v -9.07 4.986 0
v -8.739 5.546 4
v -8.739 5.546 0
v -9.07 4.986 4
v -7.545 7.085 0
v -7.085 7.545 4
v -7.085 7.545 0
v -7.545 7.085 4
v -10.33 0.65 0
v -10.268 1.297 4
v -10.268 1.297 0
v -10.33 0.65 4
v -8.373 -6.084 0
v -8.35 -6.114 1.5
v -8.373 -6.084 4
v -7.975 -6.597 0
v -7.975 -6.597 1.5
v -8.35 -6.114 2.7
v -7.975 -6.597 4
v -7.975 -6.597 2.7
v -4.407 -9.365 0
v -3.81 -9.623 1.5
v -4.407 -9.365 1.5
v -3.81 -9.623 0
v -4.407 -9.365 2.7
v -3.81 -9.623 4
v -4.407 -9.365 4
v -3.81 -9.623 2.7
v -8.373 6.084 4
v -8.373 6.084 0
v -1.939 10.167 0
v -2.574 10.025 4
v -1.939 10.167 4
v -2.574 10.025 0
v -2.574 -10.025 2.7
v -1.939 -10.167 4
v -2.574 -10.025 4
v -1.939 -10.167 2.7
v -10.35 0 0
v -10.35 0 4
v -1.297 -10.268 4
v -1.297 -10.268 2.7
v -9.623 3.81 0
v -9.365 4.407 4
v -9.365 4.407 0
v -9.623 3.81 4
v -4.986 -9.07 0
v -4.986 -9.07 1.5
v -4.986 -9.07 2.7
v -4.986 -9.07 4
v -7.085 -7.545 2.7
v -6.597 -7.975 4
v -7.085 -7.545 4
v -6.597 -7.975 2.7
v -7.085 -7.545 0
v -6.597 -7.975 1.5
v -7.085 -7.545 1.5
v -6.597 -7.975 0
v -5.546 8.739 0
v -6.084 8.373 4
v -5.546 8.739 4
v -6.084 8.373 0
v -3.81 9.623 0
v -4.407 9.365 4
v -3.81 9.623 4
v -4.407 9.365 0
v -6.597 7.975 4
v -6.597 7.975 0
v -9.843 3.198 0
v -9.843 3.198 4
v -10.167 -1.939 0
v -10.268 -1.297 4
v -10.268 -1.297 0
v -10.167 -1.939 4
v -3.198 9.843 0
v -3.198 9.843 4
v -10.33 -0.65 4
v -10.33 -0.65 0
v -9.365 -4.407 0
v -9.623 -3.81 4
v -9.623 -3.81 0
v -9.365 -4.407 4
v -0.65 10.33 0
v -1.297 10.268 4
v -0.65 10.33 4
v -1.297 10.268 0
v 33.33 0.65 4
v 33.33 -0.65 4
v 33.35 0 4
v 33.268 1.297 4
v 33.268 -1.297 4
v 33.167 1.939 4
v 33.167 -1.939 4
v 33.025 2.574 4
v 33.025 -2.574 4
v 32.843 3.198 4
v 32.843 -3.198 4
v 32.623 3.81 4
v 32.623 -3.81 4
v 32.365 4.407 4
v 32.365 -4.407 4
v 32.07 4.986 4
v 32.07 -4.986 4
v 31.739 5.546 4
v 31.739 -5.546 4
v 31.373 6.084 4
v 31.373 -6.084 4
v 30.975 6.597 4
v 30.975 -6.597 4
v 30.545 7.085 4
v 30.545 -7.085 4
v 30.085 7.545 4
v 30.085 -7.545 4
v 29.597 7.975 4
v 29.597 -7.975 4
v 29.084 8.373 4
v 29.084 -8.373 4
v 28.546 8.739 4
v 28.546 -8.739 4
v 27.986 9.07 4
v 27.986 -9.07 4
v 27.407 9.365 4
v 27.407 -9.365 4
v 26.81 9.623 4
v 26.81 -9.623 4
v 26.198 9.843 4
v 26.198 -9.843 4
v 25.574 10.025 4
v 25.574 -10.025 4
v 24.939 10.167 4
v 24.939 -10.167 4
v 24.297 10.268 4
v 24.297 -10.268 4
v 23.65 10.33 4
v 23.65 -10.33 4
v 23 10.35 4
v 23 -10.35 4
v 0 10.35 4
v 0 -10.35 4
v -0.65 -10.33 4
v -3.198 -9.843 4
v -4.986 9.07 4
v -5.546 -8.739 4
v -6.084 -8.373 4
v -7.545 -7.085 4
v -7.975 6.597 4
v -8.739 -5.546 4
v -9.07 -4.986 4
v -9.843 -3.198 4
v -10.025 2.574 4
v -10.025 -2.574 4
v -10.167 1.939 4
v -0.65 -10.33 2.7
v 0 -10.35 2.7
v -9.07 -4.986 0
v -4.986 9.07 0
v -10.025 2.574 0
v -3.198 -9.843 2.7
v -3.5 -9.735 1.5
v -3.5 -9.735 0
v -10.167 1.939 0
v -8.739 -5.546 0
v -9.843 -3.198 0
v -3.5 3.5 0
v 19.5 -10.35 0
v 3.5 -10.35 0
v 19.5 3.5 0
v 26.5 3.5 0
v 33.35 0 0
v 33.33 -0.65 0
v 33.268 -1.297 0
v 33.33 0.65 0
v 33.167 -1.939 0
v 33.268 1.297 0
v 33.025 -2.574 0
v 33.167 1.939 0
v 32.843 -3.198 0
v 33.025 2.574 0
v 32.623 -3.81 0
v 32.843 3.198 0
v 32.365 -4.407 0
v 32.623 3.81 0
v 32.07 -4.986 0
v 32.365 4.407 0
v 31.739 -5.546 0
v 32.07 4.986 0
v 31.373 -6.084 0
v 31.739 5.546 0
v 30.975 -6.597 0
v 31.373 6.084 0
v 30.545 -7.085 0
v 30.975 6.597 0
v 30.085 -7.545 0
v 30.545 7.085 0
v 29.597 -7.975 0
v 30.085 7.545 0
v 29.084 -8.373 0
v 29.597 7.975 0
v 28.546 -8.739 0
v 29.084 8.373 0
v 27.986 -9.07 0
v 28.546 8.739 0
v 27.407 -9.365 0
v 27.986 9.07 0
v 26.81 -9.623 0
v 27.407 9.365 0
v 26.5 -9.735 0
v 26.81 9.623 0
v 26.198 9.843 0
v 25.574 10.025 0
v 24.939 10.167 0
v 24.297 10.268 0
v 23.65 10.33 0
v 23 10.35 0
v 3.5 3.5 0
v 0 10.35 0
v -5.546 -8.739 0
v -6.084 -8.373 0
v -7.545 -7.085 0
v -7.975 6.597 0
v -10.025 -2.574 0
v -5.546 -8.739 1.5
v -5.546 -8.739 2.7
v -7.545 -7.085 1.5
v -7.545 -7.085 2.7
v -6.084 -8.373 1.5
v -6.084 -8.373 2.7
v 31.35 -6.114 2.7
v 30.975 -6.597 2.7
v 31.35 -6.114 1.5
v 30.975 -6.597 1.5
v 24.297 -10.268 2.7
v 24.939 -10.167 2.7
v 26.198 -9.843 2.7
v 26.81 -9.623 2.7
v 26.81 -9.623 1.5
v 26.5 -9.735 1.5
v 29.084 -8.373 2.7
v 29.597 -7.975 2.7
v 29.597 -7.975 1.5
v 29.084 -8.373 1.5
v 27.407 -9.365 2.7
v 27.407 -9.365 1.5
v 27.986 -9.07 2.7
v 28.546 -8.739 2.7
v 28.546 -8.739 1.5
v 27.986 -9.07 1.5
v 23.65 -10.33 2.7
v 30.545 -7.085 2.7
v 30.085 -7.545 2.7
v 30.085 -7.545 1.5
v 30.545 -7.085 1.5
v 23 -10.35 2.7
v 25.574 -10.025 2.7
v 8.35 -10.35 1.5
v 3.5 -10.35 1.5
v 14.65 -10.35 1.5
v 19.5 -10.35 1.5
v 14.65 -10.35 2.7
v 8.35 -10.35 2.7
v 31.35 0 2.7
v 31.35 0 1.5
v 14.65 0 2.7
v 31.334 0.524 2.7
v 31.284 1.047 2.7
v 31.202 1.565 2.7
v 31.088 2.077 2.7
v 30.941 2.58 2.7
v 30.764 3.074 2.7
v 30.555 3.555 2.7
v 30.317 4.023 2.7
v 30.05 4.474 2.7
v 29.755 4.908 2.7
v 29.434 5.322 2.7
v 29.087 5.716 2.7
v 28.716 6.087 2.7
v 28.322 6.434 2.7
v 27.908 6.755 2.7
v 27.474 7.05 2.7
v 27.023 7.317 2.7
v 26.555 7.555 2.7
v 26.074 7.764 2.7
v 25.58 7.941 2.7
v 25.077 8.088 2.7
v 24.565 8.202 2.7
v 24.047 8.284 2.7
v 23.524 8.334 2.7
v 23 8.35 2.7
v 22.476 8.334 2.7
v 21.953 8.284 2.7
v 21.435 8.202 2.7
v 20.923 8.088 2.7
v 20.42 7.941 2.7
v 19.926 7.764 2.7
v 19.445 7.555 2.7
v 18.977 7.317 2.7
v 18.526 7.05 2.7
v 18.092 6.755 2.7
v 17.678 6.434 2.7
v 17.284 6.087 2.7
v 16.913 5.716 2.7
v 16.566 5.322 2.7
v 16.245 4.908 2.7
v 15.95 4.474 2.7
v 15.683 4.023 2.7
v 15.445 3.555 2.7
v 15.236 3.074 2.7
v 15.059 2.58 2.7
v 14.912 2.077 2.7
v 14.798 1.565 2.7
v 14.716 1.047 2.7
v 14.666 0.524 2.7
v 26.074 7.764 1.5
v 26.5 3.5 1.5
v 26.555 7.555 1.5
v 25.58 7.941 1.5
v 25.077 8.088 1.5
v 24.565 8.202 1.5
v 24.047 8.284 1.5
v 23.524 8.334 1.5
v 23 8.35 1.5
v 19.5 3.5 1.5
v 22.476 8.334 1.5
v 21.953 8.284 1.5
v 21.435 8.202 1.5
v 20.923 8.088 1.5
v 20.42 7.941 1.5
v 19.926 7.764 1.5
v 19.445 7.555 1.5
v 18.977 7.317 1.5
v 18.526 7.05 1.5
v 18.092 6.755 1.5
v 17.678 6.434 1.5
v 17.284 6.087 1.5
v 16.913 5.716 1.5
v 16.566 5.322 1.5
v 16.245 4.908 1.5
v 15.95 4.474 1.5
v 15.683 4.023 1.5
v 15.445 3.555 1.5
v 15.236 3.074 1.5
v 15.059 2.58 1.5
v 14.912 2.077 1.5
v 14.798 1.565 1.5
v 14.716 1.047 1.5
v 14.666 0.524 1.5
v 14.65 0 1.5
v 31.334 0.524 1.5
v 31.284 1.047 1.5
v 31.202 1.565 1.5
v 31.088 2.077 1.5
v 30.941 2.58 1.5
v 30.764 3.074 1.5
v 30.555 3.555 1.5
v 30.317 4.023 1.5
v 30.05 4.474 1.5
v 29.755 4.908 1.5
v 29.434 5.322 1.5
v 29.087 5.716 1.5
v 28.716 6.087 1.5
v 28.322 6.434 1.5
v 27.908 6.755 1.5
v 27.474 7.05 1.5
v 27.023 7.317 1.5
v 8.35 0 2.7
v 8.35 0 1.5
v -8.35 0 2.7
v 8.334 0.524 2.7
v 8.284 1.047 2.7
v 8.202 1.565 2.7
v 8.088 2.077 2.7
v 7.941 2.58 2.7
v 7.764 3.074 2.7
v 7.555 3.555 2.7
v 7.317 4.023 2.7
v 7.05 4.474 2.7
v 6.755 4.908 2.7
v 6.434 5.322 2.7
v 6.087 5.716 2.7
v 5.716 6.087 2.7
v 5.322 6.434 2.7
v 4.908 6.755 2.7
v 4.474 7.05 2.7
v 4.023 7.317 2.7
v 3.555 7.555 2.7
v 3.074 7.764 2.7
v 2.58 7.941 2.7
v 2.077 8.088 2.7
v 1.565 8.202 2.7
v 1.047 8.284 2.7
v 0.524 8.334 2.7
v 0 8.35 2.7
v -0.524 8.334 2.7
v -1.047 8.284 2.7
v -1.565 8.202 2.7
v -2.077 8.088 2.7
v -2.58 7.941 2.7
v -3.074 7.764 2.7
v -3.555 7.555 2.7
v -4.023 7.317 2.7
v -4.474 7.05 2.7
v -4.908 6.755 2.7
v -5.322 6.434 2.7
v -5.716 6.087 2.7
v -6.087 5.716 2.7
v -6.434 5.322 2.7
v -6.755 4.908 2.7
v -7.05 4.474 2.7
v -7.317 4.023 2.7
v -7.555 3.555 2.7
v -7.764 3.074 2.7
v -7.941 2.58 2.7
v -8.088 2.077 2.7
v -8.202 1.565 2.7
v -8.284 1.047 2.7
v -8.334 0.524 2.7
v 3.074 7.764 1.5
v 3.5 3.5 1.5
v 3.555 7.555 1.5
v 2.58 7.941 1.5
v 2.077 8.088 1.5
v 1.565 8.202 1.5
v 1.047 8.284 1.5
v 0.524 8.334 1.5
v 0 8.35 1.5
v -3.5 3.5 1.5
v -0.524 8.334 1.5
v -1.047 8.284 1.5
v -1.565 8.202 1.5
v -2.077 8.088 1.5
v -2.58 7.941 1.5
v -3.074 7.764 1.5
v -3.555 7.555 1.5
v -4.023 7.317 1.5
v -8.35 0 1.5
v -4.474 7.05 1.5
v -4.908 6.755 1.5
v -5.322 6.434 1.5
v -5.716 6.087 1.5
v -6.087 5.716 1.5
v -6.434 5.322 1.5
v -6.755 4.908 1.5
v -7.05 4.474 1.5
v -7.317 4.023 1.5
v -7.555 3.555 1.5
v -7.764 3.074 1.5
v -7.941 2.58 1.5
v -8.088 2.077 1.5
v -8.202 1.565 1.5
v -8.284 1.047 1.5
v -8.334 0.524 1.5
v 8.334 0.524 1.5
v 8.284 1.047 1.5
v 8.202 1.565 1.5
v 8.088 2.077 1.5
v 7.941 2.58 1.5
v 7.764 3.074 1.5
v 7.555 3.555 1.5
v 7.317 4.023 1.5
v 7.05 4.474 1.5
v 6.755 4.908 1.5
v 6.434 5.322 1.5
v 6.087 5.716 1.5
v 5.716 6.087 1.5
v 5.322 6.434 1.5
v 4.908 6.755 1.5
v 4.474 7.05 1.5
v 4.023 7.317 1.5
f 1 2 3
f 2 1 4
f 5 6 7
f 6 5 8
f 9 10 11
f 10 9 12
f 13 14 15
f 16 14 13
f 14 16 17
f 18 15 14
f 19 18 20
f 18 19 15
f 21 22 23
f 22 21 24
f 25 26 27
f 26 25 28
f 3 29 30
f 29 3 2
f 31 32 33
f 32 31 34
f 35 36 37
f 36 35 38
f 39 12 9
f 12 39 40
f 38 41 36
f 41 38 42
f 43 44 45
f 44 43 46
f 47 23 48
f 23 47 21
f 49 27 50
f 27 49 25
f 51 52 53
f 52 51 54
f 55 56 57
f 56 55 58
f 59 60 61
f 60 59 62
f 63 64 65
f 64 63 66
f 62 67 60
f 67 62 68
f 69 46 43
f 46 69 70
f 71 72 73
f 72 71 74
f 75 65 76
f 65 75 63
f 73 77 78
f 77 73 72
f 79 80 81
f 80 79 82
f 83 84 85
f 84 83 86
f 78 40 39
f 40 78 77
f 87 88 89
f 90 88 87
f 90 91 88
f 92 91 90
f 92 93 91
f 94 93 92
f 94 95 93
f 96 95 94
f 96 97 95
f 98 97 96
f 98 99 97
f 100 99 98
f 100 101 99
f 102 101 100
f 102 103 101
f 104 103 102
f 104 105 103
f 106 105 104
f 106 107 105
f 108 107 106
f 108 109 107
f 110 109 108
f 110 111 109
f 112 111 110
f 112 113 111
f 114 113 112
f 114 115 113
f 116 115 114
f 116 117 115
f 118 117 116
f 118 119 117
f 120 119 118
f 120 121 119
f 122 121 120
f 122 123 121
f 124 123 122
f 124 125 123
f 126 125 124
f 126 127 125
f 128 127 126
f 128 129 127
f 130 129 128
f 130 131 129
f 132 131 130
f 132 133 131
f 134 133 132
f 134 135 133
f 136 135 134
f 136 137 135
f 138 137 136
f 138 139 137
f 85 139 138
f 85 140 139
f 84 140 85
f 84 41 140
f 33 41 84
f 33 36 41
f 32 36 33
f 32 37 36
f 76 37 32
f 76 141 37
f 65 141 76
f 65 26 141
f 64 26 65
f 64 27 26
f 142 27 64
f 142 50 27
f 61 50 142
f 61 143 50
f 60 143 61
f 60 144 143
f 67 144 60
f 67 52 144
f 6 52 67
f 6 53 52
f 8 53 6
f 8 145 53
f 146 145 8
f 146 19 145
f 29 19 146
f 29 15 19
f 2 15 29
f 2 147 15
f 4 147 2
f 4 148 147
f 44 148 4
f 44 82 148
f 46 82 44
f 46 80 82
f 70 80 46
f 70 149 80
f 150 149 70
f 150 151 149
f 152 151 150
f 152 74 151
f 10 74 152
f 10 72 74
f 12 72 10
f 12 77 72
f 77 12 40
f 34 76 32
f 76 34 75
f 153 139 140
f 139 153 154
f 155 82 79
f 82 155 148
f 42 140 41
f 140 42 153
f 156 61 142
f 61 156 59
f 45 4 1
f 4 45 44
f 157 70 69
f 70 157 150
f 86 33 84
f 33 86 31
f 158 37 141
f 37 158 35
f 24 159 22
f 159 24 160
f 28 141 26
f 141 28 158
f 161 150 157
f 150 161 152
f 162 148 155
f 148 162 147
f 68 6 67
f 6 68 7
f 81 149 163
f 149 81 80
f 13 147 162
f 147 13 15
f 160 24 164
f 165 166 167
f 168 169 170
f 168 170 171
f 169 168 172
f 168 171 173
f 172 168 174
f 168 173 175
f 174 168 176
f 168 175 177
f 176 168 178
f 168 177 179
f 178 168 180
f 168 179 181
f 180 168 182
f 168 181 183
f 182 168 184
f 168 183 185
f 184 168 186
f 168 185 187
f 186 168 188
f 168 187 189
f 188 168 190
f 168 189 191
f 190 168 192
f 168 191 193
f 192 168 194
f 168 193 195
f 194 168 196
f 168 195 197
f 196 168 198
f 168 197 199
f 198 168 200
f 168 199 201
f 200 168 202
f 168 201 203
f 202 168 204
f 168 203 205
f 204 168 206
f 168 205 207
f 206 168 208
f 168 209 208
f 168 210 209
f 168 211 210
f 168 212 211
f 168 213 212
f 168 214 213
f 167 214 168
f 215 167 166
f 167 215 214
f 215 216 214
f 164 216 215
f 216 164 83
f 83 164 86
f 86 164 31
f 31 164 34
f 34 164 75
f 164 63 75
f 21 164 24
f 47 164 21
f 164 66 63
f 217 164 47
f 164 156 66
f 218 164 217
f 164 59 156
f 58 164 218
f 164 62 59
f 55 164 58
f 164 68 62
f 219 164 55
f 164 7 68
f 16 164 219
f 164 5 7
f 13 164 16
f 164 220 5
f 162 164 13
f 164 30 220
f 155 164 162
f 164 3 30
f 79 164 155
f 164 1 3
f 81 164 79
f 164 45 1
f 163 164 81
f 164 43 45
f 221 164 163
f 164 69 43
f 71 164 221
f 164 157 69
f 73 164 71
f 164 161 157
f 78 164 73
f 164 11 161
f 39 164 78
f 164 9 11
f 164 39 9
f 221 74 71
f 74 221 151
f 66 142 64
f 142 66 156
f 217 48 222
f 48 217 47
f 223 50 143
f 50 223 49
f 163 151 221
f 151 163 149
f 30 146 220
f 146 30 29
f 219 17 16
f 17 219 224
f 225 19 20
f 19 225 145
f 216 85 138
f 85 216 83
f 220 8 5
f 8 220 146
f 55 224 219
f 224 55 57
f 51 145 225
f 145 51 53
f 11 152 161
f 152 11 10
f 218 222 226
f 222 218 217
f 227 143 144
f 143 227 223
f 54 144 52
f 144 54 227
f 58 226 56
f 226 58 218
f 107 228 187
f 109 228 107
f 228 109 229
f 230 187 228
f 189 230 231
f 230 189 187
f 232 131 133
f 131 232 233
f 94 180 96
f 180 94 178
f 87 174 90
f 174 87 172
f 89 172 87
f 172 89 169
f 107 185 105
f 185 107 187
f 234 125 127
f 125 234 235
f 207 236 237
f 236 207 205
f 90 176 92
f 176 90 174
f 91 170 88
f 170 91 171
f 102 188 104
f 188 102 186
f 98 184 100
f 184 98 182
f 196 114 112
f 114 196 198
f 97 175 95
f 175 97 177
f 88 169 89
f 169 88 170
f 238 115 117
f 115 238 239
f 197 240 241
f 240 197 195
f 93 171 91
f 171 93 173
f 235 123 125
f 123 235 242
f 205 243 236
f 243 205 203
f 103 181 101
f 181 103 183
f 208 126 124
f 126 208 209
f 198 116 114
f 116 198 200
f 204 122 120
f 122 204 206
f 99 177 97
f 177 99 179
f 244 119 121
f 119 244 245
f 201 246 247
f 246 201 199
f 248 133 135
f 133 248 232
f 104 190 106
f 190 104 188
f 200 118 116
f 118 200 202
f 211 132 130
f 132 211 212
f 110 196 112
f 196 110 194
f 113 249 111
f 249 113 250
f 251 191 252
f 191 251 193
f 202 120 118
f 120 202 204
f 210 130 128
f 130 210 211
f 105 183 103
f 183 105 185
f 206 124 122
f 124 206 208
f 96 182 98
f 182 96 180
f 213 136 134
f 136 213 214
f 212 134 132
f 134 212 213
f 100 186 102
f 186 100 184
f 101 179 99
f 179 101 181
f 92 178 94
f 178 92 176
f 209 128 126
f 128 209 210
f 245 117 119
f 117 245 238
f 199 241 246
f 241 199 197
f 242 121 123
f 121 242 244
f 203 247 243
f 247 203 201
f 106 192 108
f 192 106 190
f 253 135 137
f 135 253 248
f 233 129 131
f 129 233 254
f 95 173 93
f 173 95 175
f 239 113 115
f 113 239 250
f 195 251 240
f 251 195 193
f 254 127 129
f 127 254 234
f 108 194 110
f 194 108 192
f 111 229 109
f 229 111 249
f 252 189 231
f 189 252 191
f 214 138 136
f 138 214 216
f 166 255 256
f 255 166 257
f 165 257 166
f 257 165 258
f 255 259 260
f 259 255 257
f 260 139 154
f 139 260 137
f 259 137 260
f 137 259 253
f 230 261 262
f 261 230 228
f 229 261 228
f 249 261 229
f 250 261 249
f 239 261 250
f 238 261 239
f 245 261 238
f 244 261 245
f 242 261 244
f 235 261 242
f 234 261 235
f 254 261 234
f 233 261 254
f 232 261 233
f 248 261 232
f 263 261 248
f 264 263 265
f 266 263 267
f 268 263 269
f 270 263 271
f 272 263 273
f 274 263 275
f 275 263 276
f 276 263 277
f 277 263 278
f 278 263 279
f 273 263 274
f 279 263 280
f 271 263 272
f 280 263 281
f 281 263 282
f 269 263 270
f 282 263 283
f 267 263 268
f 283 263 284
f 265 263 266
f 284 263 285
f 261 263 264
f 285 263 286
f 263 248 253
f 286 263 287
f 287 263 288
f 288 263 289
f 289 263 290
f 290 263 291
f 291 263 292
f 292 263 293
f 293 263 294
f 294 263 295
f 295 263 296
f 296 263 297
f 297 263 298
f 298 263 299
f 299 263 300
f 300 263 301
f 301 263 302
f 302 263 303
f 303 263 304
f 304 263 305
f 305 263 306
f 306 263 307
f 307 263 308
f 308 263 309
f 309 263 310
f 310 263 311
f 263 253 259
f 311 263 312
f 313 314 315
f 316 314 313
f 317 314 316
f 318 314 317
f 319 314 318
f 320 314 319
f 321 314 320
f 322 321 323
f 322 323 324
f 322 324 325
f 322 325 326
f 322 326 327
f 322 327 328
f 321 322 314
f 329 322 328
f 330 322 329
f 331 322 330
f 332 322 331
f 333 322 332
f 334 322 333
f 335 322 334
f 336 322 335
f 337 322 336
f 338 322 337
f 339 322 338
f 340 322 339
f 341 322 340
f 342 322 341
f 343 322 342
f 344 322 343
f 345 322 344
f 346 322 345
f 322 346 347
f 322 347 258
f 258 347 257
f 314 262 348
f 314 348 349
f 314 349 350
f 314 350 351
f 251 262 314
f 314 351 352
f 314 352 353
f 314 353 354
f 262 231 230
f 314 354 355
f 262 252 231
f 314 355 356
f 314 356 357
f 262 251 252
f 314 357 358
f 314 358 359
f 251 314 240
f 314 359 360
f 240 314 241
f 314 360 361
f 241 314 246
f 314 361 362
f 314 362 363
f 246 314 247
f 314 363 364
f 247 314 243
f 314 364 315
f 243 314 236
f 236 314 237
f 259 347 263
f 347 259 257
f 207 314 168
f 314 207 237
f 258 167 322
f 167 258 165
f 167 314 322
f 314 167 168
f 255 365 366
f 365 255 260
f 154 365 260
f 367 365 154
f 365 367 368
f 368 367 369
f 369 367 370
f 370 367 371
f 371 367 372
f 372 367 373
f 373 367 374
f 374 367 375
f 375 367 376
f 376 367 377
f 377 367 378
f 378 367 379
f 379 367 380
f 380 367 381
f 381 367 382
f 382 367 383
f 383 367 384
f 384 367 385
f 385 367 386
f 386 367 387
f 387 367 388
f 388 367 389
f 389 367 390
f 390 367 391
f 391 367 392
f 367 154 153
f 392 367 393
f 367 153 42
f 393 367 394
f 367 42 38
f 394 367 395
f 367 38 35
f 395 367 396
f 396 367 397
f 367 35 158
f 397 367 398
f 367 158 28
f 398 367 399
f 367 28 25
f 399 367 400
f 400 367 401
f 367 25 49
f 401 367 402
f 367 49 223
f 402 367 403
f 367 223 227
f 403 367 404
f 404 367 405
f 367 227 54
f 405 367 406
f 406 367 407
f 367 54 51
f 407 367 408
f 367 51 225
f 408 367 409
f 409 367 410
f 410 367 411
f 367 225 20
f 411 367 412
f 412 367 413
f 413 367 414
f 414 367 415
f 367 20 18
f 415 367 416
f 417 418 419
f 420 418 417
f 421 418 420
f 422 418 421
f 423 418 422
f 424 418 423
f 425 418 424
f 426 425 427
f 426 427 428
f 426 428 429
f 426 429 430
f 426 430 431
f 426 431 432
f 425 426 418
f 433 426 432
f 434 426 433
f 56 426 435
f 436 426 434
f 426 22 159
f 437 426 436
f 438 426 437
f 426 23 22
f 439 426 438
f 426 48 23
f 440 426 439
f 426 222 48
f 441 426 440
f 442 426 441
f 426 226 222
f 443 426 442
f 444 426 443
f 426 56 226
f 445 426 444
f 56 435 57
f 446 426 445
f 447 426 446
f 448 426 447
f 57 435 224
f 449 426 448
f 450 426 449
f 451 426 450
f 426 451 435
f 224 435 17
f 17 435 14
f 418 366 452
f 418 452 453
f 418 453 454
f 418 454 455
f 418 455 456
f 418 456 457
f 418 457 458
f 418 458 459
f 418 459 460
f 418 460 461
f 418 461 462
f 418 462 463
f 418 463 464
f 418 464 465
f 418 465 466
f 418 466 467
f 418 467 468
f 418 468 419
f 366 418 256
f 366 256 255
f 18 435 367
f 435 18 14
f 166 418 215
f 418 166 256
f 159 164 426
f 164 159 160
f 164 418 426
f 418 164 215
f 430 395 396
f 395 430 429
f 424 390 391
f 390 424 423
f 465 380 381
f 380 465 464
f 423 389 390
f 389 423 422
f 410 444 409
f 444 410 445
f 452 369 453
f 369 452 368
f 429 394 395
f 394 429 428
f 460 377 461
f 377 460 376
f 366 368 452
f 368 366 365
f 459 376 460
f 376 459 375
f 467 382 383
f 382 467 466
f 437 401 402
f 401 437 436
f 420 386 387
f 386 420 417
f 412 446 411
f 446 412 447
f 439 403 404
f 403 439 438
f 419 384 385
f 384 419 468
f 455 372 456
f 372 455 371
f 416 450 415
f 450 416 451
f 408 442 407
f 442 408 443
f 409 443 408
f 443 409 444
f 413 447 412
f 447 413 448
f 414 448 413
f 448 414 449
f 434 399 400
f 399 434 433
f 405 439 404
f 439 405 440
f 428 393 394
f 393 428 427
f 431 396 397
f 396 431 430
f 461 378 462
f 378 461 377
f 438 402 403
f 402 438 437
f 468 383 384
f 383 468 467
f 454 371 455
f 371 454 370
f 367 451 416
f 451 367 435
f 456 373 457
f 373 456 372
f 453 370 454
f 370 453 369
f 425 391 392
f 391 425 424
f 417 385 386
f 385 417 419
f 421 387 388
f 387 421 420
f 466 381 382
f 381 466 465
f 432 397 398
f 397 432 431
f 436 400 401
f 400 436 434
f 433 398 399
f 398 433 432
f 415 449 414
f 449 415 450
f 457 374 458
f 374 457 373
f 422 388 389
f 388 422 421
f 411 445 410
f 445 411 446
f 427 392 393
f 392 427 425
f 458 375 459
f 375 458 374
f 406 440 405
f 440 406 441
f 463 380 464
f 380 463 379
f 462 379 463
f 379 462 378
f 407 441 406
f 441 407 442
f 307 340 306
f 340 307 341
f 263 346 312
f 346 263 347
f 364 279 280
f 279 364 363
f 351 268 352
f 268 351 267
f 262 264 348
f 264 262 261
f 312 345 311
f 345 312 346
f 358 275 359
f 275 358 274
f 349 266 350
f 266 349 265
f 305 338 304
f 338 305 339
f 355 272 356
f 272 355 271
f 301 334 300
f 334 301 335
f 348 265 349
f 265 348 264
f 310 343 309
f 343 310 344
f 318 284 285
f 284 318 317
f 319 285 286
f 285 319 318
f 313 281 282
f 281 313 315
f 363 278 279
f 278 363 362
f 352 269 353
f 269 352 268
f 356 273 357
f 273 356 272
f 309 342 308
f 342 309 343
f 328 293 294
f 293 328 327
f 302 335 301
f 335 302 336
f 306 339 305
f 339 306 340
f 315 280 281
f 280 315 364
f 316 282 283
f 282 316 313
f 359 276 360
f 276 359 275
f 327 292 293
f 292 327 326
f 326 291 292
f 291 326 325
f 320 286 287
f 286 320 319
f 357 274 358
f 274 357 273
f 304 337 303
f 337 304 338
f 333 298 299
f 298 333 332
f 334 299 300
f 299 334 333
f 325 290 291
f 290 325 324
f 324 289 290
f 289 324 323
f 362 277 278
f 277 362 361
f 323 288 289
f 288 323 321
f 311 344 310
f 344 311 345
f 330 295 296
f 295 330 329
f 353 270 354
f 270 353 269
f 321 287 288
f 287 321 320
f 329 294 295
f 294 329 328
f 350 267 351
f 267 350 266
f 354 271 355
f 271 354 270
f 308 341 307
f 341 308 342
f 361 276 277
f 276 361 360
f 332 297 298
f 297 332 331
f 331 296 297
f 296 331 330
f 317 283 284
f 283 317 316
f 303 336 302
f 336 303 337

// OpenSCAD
$fn=100;

//top part
difference(){
    union(){
        cylinder(h=4, d=20.7);
        translate([23,0,0]) cylinder(h=4, d=20.7);
        translate([0,-10.35,0]) cube([23,20.7,4]);
    }
    
    
    translate([23,-10,2.1]) cube([16.7,20,1.2], center=true);
    translate([23,-10,0]) cube([7,27,5], center=true);
    
    translate([0,-10,2.1]) cube([16.7,20,1.2], center=true);
    translate([0,-10,0]) cube([7,27,5], center=true);
    
    translate([0,0,1.5]) cylinder(h=1.2, d=16.7);
    translate([23,0,1.5]) cylinder(h=1.2, d=16.7);
}
